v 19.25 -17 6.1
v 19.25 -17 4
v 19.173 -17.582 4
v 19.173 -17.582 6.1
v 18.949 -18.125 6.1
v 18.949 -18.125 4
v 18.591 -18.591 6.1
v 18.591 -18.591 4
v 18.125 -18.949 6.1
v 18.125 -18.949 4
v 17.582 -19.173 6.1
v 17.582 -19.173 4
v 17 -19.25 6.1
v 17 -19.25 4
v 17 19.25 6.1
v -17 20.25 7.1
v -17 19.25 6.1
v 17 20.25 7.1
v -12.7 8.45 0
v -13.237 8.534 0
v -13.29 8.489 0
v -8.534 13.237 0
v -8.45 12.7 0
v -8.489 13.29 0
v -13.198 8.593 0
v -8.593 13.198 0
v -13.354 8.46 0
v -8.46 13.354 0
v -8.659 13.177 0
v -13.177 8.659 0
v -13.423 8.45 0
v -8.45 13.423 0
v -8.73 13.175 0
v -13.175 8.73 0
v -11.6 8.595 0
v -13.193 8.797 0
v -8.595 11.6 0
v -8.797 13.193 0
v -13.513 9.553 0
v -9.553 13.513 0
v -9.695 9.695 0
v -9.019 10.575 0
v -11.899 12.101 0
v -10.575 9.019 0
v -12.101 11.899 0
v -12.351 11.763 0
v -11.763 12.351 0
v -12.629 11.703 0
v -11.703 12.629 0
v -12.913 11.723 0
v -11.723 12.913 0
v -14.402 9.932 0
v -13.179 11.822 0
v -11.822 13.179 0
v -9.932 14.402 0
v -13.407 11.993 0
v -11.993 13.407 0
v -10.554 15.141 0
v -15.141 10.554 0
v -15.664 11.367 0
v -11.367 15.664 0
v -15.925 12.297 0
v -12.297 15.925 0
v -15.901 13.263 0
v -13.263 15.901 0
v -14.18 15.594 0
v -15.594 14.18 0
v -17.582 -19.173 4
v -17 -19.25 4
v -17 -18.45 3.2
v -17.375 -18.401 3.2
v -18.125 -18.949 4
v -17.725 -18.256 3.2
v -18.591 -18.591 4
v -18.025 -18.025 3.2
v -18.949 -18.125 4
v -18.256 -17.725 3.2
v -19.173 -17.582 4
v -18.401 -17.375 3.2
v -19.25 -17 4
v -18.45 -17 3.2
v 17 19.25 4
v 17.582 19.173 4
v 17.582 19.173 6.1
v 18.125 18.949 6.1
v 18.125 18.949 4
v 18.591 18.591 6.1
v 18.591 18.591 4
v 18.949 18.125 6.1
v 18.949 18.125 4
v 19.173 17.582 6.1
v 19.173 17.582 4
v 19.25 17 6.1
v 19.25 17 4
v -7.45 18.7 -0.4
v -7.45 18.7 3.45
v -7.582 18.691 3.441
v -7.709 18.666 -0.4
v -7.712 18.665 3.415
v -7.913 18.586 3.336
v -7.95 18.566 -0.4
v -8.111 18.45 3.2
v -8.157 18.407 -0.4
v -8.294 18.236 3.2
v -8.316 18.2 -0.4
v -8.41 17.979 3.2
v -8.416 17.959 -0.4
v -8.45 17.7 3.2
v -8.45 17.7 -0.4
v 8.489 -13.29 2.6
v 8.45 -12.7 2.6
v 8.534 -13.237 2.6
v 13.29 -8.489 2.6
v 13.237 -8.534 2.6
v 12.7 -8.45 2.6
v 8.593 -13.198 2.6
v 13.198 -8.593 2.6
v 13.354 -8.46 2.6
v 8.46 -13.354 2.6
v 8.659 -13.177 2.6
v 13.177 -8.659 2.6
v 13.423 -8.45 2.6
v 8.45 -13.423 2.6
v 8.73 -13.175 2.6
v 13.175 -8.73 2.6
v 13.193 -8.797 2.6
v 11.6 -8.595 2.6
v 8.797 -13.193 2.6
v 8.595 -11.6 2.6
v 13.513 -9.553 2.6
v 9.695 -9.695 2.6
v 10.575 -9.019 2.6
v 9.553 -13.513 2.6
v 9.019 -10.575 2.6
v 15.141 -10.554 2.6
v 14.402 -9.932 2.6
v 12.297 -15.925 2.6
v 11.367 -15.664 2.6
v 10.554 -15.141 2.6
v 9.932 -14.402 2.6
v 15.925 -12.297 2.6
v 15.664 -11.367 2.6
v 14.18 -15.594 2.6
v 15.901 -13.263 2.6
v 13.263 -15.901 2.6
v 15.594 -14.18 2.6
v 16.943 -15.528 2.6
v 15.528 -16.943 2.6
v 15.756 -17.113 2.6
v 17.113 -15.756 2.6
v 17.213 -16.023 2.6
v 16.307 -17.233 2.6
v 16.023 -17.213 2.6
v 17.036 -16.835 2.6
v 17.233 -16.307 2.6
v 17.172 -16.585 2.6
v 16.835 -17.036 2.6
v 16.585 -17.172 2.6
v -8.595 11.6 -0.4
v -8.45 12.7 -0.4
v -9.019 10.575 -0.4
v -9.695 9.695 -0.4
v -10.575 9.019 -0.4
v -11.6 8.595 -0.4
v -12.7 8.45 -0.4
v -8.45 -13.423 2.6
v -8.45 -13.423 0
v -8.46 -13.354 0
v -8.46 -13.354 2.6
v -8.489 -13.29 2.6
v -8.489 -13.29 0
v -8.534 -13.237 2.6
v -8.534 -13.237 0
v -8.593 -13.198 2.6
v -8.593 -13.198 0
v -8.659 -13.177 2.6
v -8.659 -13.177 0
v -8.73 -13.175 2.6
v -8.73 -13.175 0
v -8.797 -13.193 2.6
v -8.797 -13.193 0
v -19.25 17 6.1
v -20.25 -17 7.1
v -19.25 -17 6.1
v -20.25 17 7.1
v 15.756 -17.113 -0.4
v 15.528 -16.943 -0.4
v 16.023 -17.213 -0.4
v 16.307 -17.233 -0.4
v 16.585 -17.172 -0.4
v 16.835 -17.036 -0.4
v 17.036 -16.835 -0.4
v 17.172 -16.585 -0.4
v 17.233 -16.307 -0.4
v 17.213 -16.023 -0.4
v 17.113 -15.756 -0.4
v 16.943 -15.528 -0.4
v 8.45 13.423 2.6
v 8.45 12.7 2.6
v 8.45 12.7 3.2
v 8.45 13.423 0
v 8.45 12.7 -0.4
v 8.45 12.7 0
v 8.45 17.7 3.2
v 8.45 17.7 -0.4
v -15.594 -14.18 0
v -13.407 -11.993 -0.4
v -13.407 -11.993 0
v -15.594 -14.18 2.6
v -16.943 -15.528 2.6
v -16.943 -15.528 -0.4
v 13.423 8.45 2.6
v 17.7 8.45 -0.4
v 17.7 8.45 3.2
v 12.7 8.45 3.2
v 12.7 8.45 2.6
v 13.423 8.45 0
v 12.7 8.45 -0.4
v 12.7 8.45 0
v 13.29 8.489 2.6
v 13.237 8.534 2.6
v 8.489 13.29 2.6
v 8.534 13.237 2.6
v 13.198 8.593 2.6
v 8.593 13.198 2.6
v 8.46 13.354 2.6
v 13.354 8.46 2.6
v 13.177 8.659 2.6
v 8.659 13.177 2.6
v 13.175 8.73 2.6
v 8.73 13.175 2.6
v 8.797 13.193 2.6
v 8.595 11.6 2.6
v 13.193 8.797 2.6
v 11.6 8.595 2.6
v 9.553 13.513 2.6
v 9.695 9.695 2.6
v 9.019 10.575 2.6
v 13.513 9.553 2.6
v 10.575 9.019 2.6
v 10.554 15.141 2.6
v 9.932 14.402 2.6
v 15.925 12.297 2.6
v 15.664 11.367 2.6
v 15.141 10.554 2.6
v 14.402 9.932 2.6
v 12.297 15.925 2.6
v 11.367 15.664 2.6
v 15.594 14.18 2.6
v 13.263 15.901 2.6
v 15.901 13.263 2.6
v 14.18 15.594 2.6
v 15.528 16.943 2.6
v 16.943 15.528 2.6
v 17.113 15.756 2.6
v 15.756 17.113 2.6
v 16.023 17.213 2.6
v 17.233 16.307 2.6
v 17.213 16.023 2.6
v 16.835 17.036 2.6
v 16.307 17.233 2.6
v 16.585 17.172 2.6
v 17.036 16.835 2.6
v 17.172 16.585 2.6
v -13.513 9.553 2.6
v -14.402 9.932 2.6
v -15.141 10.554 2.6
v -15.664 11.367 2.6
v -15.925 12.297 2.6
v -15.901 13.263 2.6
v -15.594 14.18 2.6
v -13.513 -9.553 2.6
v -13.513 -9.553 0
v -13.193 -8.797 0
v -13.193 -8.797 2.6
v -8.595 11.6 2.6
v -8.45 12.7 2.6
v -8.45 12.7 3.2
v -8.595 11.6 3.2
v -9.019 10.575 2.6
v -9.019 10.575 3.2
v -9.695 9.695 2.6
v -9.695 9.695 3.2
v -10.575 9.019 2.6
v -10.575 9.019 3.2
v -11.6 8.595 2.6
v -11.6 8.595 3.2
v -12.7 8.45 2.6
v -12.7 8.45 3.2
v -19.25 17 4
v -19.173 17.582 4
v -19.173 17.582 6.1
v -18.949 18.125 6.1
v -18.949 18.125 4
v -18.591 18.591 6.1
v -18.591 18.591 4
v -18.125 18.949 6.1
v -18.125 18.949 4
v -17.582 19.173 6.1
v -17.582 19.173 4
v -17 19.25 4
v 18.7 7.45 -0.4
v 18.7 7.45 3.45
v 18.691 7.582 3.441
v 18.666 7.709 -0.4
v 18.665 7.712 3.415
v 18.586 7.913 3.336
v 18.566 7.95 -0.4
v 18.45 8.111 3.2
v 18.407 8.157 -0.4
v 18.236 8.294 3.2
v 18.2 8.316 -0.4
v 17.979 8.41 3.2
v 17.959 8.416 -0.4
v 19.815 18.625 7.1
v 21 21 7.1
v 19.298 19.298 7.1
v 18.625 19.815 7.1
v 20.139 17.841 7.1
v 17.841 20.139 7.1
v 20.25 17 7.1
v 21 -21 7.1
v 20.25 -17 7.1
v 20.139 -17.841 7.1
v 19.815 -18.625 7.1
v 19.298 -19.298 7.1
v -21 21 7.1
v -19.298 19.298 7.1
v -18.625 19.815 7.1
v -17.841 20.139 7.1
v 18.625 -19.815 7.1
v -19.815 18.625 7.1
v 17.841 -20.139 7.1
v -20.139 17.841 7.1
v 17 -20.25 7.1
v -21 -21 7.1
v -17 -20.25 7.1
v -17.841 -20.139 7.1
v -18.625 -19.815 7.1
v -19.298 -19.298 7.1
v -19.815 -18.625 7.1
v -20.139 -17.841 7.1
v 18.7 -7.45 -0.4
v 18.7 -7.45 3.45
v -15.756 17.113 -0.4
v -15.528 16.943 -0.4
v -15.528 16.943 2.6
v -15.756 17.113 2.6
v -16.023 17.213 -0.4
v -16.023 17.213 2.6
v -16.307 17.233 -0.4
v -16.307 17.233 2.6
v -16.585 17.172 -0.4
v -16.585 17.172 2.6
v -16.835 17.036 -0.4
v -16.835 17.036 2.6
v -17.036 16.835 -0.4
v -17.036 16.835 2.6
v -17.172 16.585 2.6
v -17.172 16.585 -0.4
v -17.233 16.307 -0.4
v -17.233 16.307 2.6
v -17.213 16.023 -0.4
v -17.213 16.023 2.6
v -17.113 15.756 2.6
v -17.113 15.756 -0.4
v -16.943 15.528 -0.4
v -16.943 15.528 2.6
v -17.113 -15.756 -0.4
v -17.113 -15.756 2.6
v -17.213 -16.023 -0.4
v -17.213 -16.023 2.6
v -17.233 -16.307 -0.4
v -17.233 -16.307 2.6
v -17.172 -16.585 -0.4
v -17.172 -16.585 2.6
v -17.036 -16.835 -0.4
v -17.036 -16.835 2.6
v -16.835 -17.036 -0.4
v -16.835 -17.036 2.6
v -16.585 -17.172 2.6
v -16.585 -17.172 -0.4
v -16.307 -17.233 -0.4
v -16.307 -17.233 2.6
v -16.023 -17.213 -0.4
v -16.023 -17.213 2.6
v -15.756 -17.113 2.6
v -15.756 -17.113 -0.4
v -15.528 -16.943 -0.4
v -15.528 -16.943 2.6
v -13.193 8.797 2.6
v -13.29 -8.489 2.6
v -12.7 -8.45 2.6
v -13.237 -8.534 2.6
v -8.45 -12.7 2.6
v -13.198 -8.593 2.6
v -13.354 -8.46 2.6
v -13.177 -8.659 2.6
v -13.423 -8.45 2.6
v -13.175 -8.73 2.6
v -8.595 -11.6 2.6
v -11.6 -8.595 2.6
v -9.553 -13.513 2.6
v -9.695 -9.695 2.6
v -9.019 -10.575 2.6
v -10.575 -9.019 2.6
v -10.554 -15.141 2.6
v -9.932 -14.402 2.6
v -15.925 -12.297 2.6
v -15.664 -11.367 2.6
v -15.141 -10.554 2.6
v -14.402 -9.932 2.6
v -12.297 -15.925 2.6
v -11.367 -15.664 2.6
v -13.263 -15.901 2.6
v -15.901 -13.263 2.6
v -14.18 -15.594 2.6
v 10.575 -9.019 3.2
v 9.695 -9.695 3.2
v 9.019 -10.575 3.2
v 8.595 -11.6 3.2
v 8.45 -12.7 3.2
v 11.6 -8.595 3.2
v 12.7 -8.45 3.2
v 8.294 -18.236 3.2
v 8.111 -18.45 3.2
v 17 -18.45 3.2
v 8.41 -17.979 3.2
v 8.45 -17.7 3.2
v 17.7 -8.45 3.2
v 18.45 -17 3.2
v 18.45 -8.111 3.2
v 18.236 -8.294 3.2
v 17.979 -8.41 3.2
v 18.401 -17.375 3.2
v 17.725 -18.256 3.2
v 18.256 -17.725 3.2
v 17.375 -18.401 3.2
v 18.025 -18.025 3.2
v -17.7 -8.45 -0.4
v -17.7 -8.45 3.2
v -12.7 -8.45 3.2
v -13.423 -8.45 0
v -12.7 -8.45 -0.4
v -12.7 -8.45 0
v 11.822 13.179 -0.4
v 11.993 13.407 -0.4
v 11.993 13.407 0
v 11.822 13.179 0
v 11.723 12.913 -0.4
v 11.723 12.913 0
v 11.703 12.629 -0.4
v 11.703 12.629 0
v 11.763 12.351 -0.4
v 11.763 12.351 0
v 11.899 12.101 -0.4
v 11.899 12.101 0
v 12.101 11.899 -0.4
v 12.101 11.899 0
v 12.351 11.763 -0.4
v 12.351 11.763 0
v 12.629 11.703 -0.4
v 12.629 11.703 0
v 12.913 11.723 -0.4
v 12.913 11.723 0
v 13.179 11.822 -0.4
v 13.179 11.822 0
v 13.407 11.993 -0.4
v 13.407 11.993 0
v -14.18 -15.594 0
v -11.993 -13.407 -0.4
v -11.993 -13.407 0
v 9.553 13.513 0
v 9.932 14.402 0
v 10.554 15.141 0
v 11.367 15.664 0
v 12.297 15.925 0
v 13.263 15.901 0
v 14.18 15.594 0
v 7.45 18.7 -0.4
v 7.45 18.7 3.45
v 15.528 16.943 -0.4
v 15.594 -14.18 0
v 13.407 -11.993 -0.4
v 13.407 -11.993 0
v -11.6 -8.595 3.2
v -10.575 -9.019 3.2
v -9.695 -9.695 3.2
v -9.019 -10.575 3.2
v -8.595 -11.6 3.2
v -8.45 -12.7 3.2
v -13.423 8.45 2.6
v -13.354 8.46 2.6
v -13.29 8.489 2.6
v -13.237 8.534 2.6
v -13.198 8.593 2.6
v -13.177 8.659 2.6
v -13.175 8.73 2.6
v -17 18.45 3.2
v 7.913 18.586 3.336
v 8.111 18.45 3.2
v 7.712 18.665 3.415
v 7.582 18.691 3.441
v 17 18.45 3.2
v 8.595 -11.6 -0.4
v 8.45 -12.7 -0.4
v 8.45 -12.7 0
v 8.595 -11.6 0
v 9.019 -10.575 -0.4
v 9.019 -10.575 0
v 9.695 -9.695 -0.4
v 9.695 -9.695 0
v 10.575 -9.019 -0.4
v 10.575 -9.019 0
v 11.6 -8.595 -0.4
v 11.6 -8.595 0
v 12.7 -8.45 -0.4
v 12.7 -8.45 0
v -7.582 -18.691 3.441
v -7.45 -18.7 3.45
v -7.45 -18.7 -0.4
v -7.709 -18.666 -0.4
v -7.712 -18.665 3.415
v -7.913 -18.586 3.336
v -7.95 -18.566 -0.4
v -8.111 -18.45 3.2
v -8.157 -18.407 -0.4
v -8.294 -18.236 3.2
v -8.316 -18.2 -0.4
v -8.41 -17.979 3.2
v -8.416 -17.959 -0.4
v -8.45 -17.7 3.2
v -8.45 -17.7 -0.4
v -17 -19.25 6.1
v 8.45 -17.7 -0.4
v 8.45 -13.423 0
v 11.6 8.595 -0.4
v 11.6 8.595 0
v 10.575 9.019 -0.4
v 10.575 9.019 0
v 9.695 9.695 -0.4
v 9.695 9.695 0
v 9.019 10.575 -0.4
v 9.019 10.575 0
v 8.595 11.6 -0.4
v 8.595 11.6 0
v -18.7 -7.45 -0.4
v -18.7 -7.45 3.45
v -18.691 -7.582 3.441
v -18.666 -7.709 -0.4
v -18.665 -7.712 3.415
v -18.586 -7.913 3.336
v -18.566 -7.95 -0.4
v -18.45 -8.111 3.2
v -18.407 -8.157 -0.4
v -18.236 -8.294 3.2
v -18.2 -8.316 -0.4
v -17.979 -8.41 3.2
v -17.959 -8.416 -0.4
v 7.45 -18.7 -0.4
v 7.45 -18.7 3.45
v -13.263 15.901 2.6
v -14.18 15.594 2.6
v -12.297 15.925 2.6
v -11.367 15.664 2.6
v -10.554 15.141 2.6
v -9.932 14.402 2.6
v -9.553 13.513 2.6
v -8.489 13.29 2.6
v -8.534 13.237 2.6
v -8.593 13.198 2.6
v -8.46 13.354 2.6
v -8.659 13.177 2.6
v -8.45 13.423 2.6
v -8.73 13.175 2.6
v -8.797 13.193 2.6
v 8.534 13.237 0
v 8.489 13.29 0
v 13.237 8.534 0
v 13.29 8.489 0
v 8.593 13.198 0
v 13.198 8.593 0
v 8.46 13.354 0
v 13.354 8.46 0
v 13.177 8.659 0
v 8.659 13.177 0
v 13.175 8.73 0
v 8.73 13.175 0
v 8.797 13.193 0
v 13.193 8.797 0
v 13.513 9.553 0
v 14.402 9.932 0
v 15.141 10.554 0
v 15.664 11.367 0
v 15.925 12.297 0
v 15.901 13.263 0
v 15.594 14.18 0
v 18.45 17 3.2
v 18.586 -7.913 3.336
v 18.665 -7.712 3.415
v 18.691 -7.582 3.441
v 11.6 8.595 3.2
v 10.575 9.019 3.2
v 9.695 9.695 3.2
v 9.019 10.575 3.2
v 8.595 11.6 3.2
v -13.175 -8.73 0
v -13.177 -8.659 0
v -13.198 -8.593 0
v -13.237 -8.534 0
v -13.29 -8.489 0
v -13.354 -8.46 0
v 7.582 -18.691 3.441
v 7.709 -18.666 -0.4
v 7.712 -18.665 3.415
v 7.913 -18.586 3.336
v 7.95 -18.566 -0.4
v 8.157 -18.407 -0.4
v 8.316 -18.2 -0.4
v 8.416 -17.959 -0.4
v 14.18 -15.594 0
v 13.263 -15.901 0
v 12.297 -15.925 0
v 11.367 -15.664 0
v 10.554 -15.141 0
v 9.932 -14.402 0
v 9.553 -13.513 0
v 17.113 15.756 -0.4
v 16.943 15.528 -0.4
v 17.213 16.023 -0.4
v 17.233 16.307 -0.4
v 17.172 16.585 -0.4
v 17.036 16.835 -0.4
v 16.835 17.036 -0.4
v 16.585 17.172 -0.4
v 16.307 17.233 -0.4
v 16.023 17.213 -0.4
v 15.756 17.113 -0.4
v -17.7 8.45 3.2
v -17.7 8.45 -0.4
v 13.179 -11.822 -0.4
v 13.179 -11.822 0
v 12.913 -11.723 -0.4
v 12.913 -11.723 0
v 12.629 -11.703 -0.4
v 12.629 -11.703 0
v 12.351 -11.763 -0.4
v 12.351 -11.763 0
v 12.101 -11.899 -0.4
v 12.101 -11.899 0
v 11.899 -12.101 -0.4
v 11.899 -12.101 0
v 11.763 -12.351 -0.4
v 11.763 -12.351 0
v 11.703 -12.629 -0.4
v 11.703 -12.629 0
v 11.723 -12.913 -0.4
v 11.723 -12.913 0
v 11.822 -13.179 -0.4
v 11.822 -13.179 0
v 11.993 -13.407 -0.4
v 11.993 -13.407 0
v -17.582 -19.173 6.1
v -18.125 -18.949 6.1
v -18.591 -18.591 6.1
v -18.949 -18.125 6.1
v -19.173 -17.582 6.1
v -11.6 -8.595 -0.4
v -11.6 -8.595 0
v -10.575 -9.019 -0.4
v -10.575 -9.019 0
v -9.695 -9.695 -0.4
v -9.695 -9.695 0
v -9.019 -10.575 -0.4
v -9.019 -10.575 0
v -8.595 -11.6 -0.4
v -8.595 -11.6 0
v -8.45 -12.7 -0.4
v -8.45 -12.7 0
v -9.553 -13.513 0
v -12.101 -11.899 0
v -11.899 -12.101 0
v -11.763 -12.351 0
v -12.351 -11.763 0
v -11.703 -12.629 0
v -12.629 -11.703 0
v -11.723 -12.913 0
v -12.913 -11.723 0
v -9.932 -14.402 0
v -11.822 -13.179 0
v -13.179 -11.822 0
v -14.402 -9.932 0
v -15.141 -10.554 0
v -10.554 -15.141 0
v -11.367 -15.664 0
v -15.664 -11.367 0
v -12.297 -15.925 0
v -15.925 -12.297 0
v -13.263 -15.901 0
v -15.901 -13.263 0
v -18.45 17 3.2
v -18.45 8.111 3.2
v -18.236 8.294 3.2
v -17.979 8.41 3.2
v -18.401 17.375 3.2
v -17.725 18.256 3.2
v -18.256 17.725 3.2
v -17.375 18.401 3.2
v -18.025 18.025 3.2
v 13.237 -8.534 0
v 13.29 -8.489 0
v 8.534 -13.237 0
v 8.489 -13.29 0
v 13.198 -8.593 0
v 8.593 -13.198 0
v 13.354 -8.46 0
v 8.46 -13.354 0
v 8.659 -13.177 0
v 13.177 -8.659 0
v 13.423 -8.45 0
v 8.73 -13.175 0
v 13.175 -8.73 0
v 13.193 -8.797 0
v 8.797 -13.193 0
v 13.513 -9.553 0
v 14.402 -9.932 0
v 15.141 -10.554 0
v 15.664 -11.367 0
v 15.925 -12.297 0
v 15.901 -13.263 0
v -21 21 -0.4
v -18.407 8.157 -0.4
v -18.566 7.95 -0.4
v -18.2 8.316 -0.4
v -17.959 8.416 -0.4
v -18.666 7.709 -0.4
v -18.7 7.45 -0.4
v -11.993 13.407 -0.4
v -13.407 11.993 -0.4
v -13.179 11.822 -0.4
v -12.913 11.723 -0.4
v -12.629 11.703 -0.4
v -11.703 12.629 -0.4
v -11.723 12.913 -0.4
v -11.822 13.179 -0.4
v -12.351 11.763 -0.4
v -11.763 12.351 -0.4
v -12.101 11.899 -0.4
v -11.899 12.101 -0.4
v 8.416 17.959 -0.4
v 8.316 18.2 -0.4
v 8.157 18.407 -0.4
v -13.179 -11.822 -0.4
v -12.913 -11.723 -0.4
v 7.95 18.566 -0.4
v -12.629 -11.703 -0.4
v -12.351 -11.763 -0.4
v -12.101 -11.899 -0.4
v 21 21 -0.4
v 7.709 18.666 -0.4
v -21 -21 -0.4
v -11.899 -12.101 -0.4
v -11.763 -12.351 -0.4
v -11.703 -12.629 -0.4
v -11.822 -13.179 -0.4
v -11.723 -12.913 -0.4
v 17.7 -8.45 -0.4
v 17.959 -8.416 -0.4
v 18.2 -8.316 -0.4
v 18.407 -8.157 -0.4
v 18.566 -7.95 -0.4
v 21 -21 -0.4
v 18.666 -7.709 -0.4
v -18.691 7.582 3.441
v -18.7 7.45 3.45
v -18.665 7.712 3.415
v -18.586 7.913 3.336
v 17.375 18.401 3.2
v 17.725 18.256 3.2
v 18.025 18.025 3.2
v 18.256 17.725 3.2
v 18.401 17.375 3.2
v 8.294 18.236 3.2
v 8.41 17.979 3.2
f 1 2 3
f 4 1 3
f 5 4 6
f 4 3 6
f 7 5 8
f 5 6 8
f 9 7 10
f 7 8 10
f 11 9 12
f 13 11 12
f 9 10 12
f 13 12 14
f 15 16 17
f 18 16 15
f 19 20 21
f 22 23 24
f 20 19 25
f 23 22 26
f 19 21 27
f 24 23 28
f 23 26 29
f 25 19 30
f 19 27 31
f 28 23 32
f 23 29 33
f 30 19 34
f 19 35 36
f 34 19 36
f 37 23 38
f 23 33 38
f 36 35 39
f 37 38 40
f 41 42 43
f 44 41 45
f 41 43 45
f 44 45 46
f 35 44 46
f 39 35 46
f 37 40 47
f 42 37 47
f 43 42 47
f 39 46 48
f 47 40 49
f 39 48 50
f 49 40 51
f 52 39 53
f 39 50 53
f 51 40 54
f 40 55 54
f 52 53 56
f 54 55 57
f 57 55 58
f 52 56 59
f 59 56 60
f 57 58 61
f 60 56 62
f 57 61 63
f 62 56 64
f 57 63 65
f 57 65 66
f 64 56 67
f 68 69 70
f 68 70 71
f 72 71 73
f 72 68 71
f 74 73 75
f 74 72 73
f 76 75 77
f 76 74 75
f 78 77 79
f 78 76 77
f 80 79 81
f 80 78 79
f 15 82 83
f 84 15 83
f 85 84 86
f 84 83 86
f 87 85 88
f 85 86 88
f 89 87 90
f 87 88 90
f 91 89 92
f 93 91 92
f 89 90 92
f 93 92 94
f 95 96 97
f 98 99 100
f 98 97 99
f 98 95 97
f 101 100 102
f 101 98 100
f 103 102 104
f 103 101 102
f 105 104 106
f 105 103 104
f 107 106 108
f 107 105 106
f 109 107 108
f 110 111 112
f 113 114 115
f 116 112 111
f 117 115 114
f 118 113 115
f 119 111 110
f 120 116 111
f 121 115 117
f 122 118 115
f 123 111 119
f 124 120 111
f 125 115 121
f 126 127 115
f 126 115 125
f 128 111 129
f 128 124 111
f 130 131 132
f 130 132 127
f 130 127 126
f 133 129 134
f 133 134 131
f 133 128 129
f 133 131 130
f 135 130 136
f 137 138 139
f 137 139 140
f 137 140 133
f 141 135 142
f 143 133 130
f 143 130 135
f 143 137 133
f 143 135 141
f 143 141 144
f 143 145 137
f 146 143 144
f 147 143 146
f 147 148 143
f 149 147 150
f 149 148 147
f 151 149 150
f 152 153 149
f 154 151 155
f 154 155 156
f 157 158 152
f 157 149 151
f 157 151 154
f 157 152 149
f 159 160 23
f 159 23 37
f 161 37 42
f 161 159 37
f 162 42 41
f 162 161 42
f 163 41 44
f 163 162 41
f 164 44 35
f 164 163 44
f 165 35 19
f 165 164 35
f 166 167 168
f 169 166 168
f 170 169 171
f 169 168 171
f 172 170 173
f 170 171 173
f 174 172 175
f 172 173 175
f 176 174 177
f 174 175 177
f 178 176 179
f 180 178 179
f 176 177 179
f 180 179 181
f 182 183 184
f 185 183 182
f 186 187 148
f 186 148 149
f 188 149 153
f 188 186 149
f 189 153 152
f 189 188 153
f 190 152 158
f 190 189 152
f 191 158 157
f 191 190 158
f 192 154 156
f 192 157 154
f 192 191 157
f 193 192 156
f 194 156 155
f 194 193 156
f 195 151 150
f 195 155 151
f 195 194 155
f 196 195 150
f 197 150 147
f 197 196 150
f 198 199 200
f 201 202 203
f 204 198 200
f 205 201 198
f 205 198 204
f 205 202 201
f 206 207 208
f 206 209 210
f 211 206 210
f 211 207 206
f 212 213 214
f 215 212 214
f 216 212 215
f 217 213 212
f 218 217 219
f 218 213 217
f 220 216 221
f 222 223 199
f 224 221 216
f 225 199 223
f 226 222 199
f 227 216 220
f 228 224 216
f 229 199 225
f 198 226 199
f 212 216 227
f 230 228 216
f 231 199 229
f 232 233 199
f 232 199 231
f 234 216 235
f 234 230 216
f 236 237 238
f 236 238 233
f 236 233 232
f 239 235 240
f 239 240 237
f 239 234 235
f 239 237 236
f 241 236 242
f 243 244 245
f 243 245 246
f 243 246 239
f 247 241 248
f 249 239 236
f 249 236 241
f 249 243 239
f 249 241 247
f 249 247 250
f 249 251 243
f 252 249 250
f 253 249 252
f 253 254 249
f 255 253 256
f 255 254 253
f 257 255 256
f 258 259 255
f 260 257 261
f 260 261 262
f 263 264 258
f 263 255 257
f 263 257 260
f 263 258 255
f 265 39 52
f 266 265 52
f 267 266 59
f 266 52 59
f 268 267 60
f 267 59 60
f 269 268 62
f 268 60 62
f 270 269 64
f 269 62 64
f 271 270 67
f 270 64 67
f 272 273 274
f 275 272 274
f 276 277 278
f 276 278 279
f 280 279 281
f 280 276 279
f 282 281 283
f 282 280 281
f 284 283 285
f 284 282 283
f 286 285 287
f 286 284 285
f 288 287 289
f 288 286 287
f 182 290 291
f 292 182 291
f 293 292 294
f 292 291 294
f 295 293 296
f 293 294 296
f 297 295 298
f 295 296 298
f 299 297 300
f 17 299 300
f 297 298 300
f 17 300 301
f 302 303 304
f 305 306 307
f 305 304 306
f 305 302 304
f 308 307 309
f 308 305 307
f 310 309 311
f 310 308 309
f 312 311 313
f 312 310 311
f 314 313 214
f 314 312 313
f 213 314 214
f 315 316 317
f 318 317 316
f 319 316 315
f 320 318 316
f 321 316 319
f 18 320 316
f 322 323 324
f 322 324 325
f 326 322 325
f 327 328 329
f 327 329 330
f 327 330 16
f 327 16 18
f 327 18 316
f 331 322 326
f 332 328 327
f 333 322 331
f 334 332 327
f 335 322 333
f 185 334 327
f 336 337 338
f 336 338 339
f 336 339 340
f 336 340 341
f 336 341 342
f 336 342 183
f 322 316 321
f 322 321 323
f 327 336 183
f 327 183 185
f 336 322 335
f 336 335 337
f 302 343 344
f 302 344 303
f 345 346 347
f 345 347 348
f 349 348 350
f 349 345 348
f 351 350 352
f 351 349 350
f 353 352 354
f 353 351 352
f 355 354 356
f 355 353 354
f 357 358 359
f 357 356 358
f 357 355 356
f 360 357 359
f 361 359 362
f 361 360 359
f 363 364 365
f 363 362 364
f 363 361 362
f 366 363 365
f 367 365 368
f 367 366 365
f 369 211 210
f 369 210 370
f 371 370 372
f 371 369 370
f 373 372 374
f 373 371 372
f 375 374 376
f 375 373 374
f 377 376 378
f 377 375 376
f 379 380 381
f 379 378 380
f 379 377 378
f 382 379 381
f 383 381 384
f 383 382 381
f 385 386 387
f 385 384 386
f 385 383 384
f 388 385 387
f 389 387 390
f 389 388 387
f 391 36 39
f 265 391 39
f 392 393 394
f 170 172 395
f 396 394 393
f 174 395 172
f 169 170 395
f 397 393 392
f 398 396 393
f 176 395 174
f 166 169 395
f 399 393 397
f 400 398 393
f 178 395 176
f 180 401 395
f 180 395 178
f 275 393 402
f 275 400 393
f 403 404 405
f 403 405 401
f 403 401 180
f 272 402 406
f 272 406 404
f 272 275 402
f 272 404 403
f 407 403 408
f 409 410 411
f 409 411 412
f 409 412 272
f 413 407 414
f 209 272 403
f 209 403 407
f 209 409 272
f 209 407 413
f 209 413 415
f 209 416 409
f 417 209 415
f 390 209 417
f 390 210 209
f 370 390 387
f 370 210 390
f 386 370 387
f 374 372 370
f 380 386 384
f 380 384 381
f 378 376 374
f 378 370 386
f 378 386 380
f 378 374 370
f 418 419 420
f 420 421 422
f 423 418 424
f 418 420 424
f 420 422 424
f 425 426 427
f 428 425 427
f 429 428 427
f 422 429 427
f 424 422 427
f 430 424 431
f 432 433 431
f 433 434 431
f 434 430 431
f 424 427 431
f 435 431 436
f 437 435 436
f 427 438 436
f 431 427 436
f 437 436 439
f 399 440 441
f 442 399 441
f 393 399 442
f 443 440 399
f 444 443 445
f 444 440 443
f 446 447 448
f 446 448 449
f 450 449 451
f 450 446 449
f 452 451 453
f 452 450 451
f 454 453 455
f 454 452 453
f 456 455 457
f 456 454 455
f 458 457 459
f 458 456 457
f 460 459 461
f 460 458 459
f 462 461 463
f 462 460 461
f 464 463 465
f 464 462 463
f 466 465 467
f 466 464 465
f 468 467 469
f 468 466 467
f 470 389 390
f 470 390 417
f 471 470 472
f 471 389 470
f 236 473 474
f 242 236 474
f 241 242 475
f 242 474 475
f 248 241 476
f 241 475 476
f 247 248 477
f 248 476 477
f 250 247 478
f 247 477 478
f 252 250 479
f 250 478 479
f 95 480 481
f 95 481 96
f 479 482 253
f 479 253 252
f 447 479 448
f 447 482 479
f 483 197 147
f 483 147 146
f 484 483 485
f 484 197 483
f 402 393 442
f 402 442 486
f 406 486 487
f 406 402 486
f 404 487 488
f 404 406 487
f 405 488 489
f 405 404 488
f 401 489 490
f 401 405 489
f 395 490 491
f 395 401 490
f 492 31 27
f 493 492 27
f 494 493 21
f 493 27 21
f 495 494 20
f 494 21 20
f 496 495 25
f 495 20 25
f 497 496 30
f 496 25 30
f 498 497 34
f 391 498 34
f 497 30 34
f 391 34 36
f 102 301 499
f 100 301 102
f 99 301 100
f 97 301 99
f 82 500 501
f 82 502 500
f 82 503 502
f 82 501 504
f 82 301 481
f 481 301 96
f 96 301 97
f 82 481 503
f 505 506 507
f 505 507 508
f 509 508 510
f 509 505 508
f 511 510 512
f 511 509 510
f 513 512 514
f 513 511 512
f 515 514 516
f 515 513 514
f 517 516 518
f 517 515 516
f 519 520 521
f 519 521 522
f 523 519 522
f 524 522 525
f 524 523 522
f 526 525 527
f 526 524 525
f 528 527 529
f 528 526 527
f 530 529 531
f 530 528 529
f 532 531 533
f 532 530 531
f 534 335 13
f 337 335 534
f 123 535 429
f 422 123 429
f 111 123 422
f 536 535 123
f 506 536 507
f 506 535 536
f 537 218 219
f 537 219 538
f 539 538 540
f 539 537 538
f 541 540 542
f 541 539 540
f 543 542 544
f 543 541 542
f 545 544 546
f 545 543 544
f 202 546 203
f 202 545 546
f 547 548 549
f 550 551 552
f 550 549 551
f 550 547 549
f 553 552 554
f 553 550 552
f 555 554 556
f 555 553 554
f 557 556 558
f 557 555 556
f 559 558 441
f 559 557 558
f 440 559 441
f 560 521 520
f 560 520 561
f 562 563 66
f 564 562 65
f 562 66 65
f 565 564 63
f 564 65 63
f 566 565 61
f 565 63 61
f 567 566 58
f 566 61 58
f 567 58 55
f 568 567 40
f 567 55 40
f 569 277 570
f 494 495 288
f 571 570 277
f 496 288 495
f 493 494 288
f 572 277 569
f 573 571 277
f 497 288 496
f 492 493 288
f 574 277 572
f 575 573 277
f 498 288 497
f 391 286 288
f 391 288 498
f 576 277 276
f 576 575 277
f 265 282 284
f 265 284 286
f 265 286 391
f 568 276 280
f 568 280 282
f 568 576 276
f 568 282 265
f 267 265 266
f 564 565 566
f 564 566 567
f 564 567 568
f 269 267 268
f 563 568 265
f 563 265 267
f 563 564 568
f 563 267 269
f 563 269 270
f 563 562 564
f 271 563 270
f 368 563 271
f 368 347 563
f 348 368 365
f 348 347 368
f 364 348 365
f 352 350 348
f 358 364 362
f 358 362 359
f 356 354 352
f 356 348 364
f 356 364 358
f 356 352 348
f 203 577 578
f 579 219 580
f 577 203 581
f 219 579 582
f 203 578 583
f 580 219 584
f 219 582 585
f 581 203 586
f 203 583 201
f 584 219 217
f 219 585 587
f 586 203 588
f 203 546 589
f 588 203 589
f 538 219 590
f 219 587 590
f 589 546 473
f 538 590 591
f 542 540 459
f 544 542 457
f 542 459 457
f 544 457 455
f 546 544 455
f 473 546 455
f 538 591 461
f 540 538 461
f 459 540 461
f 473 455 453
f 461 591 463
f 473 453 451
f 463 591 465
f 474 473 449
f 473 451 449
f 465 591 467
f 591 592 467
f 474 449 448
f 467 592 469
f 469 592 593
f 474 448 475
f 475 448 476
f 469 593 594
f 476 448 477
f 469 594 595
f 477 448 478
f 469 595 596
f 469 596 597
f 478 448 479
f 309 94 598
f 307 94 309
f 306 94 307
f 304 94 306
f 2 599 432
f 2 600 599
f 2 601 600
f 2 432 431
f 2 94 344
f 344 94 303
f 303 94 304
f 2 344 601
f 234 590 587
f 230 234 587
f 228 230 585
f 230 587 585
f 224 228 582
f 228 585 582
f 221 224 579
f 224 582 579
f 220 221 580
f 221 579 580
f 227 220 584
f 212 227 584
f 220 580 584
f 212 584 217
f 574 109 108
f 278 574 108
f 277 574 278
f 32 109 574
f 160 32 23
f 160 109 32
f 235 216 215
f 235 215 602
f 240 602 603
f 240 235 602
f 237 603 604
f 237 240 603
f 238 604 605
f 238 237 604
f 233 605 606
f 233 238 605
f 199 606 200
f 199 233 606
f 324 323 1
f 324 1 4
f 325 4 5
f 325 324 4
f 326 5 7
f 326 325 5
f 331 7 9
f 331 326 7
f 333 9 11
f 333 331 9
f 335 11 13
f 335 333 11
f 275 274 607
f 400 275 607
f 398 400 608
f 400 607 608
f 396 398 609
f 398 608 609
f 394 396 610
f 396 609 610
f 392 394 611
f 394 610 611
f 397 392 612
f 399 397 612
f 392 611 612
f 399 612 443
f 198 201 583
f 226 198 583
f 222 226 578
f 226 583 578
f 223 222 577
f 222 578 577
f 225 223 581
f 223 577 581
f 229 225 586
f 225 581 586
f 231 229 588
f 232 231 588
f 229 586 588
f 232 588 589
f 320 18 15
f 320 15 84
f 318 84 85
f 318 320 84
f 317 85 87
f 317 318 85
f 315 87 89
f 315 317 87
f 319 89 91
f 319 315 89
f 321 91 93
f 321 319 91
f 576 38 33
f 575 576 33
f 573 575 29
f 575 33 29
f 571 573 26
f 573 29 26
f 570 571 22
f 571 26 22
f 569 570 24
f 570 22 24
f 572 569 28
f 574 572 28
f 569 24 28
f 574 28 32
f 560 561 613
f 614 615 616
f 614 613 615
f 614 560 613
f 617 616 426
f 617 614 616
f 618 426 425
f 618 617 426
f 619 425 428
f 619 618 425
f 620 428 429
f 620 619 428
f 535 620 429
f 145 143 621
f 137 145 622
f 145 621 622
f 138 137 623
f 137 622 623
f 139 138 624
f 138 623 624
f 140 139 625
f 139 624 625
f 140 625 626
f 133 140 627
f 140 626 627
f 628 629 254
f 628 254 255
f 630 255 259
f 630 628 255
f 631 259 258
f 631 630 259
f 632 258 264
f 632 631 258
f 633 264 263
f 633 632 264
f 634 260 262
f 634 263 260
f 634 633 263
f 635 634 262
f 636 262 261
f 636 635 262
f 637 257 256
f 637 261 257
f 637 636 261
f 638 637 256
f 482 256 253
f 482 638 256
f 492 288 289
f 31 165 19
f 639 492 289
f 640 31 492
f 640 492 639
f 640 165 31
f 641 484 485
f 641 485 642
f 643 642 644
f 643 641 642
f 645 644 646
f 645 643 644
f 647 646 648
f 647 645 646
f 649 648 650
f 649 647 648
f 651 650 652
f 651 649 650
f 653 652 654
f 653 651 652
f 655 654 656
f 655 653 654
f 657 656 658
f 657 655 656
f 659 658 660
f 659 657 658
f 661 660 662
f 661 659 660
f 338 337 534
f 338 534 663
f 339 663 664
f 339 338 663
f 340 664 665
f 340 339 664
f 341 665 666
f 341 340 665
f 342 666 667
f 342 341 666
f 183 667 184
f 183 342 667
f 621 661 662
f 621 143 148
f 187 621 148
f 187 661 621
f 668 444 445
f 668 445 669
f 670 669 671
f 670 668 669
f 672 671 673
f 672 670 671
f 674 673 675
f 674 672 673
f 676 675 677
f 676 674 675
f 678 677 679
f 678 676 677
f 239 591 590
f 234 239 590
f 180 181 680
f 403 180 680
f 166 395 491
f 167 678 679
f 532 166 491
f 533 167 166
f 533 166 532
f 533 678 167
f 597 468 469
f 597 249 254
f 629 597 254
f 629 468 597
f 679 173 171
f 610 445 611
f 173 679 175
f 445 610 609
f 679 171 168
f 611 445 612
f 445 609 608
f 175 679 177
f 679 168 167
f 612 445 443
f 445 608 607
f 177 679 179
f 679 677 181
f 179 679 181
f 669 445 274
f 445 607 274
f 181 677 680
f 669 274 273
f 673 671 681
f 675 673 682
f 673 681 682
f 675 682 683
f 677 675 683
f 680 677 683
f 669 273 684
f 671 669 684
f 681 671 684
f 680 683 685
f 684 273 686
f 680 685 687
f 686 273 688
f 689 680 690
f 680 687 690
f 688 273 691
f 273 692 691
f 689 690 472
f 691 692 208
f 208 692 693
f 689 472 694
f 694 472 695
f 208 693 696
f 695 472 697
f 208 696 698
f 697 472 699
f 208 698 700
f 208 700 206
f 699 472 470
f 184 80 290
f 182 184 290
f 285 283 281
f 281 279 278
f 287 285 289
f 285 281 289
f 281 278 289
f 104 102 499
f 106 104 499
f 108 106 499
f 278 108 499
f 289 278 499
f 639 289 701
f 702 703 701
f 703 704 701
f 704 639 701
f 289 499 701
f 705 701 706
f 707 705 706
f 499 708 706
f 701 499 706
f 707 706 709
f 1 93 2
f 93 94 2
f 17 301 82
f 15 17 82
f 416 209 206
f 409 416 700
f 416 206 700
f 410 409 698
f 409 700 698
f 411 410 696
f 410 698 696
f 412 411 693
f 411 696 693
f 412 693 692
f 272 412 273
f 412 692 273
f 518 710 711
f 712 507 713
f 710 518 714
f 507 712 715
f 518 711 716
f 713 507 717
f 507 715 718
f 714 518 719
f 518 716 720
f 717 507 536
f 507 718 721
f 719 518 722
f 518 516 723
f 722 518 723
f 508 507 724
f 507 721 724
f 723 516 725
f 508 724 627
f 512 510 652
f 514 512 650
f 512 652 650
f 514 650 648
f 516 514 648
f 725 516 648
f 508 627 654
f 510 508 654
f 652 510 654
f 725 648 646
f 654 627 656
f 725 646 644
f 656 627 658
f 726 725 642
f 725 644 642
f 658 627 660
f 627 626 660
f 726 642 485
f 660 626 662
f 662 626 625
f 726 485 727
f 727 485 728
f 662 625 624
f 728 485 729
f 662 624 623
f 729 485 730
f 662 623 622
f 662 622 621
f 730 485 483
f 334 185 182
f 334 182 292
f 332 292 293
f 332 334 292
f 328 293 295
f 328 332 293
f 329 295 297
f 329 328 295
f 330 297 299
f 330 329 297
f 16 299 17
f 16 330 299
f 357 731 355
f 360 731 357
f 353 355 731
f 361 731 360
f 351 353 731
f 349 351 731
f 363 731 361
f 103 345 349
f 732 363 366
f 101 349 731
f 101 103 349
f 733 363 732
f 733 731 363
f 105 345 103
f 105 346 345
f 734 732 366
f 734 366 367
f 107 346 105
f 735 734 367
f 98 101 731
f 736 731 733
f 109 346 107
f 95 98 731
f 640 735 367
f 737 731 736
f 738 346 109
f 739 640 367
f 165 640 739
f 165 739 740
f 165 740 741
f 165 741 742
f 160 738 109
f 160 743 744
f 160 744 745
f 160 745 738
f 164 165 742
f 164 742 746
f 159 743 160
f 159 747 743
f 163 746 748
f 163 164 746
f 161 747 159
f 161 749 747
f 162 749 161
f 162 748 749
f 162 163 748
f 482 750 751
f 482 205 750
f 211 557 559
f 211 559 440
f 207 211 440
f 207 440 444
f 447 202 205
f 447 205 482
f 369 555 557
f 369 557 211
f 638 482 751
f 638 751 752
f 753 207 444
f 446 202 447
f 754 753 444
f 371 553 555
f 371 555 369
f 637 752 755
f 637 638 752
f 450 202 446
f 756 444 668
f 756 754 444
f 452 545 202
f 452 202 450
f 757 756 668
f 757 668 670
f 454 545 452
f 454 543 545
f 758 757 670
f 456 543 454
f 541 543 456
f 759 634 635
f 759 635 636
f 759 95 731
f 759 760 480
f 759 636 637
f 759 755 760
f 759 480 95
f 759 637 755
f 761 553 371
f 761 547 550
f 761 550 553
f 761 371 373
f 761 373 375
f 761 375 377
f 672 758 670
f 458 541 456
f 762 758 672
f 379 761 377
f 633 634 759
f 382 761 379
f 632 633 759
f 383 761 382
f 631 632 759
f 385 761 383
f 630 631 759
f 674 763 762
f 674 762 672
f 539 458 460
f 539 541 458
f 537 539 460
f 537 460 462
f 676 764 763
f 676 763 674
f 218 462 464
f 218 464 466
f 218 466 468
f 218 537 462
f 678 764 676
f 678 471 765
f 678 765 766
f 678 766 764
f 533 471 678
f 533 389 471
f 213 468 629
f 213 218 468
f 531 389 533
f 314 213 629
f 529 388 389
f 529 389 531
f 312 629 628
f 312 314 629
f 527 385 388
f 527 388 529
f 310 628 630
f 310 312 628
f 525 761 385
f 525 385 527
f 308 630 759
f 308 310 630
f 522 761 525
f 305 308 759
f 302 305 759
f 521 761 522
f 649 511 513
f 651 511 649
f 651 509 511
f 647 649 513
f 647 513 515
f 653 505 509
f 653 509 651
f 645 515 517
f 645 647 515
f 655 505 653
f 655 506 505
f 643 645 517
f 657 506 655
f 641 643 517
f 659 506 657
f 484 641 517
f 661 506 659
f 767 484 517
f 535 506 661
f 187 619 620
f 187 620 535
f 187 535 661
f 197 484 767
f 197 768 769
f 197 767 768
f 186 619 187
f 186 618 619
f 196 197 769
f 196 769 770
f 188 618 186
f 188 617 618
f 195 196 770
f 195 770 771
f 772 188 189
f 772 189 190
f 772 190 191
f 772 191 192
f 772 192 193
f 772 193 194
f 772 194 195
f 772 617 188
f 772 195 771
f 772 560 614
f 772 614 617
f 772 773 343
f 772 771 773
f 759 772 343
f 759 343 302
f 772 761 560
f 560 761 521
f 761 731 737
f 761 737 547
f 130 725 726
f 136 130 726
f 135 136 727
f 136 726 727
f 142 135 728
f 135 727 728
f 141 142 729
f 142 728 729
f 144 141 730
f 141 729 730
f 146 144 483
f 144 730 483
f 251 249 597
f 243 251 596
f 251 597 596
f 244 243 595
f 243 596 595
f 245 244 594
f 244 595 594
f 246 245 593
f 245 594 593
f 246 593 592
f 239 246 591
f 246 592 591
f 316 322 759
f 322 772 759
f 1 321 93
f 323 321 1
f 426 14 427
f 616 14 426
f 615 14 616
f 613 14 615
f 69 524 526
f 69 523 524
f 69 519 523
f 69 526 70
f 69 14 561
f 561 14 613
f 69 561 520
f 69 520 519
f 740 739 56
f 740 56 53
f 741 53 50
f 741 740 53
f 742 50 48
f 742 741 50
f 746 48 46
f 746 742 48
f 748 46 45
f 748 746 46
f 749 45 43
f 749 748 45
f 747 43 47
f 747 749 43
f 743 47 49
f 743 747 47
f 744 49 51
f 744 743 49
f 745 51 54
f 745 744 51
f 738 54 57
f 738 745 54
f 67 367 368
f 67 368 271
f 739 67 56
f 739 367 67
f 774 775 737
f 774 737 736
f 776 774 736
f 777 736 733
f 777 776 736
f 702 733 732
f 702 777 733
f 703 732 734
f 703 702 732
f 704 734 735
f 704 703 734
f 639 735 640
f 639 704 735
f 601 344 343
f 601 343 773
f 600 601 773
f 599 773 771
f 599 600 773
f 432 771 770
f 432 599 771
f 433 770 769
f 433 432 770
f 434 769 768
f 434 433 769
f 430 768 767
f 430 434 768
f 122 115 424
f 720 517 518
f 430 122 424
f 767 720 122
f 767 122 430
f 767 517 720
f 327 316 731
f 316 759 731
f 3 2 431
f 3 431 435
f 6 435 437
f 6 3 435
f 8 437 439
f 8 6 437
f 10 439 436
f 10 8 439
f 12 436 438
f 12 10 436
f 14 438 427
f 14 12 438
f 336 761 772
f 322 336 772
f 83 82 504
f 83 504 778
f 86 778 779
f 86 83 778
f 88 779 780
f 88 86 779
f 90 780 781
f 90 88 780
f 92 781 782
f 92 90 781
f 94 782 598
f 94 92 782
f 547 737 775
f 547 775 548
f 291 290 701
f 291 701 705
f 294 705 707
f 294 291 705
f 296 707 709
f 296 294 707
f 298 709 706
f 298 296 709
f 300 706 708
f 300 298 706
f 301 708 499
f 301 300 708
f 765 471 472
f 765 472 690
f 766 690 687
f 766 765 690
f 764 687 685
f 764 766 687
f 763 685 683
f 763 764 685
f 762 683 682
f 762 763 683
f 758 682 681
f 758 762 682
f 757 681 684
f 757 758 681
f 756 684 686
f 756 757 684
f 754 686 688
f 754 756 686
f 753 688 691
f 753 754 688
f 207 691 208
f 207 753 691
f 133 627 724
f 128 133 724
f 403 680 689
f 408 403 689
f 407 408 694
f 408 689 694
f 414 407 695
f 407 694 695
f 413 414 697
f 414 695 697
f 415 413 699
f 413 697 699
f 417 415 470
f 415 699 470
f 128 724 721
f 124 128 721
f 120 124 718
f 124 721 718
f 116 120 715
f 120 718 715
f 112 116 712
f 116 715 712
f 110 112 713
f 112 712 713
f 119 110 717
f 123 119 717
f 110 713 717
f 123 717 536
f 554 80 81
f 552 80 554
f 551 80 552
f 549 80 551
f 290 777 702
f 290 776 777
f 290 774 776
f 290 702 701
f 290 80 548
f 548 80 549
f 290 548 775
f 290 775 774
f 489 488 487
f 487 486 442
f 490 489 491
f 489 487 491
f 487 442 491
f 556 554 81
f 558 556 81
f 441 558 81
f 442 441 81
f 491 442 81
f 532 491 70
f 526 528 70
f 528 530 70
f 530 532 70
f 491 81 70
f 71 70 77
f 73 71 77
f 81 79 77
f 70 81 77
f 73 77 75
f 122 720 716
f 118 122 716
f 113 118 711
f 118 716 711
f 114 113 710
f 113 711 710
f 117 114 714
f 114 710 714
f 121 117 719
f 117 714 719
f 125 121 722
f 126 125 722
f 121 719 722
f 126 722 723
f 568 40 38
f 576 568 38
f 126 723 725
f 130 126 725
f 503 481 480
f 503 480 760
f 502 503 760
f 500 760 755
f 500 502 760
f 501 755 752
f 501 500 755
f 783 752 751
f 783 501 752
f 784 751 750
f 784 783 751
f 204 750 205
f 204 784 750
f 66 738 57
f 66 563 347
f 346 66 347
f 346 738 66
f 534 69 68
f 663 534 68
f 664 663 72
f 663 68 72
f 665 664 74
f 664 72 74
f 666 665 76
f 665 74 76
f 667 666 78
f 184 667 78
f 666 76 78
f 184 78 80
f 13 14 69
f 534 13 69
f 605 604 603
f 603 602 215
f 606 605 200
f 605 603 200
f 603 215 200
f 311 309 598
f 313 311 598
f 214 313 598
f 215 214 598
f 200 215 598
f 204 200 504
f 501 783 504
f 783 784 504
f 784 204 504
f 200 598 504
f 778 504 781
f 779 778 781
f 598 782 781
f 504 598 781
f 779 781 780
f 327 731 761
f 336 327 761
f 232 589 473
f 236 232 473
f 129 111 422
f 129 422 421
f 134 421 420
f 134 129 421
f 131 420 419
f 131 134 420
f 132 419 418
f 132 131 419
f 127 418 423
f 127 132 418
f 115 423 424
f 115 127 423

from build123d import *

# Parameters (mm, degrees)
MAGNET_SLOT_DEPTH   = 2.6
MAGNET_TOPPER_DEPTH = 0.6
BOTTOM_START        = 0.4
BOTTOM_DEPTH        = 0.4
CUT_EXTRUDE1_REACH  = 31.916
FILLET1_R           = 1
BOSS_EXTRUDE1_DEPTH = 3.9
CHAMFER1_SIZE       = 0.8
CHAMFER2_SIZE       = 1
CIRPATTERN1_COUNT   = 4


with BuildPart() as part:
    # Sketch1 → Magnet Slot (new body)
    with BuildSketch(Plane.XY):
        with BuildLine():
            Line((-21, 0), (-18.7, 0))
            Line((-18.7, 0), (-18.7, 8.45))
            Line((-18.7, 8.45), (-13.423469406, 8.45))
            ThreePointArc((-13.423469406, 8.45), (-13.215070921, 8.56190557), (-13.193240046, 8.797439428))
            Line((-13.193240046, 8.797439428), (-13.513172798, 9.553374824))
            ThreePointArc((-13.513172798, 9.553374824), (-14.998097039, 14.998097039), (-9.553374824, 13.513172798))
            Line((-9.553374824, 13.513172798), (-8.797439428, 13.193240046))
            ThreePointArc((-8.797439428, 13.193240046), (-8.56190557, 13.215070921), (-8.45, 13.423469406))
            Line((-8.45, 13.423469406), (-8.45, 18.7))
            Line((-8.45, 18.7), (0, 18.7))
            Line((0, 18.7), (0, 21))
            Line((0, 21), (-21, 21))
            Line((-21, 21), (-21, 0))
        make_face()
    extrude(amount=MAGNET_SLOT_DEPTH)

    # Sketch2 → Magnet Topper (add)
    with BuildSketch(Plane.XY.offset(2.6)):
        with BuildLine():
            Line((-12.7, 8.45), (-18.7, 8.45))
            Line((-18.7, 8.45), (-18.7, 0))
            Line((-18.7, 0), (-21, 0))
            Line((-21, 0), (-21, 21))
            Line((-21, 21), (0, 21))
            Line((0, 21), (0, 18.7))
            Line((0, 18.7), (-8.45, 18.7))
            Line((-8.45, 18.7), (-8.45, 12.7))
            ThreePointArc((-8.45, 12.7), (-9.69479618, 9.69479618), (-12.7, 8.45))
        make_face()
    extrude(amount=MAGNET_TOPPER_DEPTH)

    # Sketch3 → Bottom (add)
    with BuildSketch(Plane(origin=(0, 0, 0), x_dir=(-1, 0, 0), z_dir=(0, 0, -1)).offset(BOTTOM_START)):
        with BuildLine():
            Line((18.7, 8.45), (18.7, 0))
            Line((18.7, 0), (21, 0))
            Line((21, 0), (21, 21))
            Line((21, 21), (0, 21))
            Line((0, 21), (0, 18.7))
            Line((0, 18.7), (8.45, 18.7))
            Line((8.45, 18.7), (8.45, 12.7))
            ThreePointArc((8.45, 12.7), (9.69479618, 9.69479618), (12.7, 8.45))
            Line((12.7, 8.45), (18.7, 8.45))
        make_face()
    extrude(amount=-BOTTOM_DEPTH)

    # Cut-Extrude1: up to this face of the body (flat: up to its plane)
    cut_extrude1_end = Plane(part.part.faces().sort_by_distance((-12.297393308, 12.297393308, 2.6))[0])
    # Sketch4 → Cut-Extrude1 (cut, up to the picked face)
    with BuildSketch(Plane(origin=(0, 0, -0.4), x_dir=(-1, 0, 0), z_dir=(0, 0, -1)), mode=Mode.PRIVATE) as cut_extrude1_sk1:
        with BuildLine():
            Line((11.992893219, 13.407106781), (15.528427125, 16.942640687))
            ThreePointArc((15.528427125, 16.942640687), (16.942640687, 16.942640687), (16.942640687, 15.528427125))
            Line((16.942640687, 15.528427125), (13.407106781, 11.992893219))
            ThreePointArc((13.407106781, 11.992893219), (11.992893219, 11.992893219), (11.992893219, 13.407106781))
        make_face()
    cut_extrude1_tool1 = split(extrude(cut_extrude1_sk1.sketch, amount=-CUT_EXTRUDE1_REACH, mode=Mode.PRIVATE), bisect_by=cut_extrude1_end, keep=Keep.BOTH, mode=Mode.PRIVATE)
    add(cut_extrude1_tool1.solids().sort_by(Axis((-14.467767, 14.467767, -0.4), (0, 0, 1)))[0], mode=Mode.SUBTRACT)

    # Fillet1
    fillet1_edges = [part.edges().sort_by_distance(p)[0] for p in [
        (-8.45, 18.7, 1.4),
        (-18.7, 8.45, 1.4),
    ]]
    fillet(fillet1_edges, radius=FILLET1_R)

    # Sketch5 → Boss-Extrude1 (add)
    with BuildSketch(Plane.XY.offset(3.2)):
        with BuildLine():
            Line((0, 21), (-17.25, 21))
            Line((-17.25, 21), (-21, 21))
            Line((-21, 21), (-21, 17.25))
            Line((-21, 17.25), (-21, 0))
            Line((-21, 0), (-19.25, 0))
            Line((-19.25, 0), (-19.25, 17))
            ThreePointArc((-19.25, 17), (-18.590990258, 18.590990258), (-17, 19.25))
            Line((-17, 19.25), (0, 19.25))
            Line((0, 19.25), (0, 21))
        make_face()
    extrude(amount=BOSS_EXTRUDE1_DEPTH)

    # Chamfer1
    chamfer1_edges = [part.edges().sort_by_distance(p)[0] for p in [
        (-19.25, 8.5, 3.2),
        (-18.590990258, 18.590990258, 3.2),
        (-8.5, 19.25, 3.2),
    ]]
    chamfer(chamfer1_edges, length=CHAMFER1_SIZE)

    # Chamfer2
    chamfer2_edges = [part.edges().sort_by_distance(p)[0] for p in [
        (-19.25, 8.5, 7.1),
        (-18.590990258, 18.590990258, 7.1),
        (-8.5, 19.25, 7.1),
    ]]
    chamfer(chamfer2_edges, length=CHAMFER2_SIZE)


with BuildPart() as cirpattern1_1:
    # CirPattern1: pattern copy
    add(part.part.rotate(Axis((0, 0, 0), (0, 0, 1)), 1 * 360 / CIRPATTERN1_COUNT))


with BuildPart() as cirpattern1_2:
    # CirPattern1: pattern copy
    add(part.part.rotate(Axis((0, 0, 0), (0, 0, 1)), 2 * 360 / CIRPATTERN1_COUNT))


with BuildPart() as cirpattern1_3:
    # CirPattern1: pattern copy
    add(part.part.rotate(Axis((0, 0, 0), (0, 0, 1)), 3 * 360 / CIRPATTERN1_COUNT))


with BuildPart() as part_1:
    add(part.part)

    # Combine1: union CirPattern1_3, CirPattern1_1, CirPattern1_2
    add(cirpattern1_3.part)
    add(cirpattern1_1.part)
    add(cirpattern1_2.part)


solid = part_1.part
